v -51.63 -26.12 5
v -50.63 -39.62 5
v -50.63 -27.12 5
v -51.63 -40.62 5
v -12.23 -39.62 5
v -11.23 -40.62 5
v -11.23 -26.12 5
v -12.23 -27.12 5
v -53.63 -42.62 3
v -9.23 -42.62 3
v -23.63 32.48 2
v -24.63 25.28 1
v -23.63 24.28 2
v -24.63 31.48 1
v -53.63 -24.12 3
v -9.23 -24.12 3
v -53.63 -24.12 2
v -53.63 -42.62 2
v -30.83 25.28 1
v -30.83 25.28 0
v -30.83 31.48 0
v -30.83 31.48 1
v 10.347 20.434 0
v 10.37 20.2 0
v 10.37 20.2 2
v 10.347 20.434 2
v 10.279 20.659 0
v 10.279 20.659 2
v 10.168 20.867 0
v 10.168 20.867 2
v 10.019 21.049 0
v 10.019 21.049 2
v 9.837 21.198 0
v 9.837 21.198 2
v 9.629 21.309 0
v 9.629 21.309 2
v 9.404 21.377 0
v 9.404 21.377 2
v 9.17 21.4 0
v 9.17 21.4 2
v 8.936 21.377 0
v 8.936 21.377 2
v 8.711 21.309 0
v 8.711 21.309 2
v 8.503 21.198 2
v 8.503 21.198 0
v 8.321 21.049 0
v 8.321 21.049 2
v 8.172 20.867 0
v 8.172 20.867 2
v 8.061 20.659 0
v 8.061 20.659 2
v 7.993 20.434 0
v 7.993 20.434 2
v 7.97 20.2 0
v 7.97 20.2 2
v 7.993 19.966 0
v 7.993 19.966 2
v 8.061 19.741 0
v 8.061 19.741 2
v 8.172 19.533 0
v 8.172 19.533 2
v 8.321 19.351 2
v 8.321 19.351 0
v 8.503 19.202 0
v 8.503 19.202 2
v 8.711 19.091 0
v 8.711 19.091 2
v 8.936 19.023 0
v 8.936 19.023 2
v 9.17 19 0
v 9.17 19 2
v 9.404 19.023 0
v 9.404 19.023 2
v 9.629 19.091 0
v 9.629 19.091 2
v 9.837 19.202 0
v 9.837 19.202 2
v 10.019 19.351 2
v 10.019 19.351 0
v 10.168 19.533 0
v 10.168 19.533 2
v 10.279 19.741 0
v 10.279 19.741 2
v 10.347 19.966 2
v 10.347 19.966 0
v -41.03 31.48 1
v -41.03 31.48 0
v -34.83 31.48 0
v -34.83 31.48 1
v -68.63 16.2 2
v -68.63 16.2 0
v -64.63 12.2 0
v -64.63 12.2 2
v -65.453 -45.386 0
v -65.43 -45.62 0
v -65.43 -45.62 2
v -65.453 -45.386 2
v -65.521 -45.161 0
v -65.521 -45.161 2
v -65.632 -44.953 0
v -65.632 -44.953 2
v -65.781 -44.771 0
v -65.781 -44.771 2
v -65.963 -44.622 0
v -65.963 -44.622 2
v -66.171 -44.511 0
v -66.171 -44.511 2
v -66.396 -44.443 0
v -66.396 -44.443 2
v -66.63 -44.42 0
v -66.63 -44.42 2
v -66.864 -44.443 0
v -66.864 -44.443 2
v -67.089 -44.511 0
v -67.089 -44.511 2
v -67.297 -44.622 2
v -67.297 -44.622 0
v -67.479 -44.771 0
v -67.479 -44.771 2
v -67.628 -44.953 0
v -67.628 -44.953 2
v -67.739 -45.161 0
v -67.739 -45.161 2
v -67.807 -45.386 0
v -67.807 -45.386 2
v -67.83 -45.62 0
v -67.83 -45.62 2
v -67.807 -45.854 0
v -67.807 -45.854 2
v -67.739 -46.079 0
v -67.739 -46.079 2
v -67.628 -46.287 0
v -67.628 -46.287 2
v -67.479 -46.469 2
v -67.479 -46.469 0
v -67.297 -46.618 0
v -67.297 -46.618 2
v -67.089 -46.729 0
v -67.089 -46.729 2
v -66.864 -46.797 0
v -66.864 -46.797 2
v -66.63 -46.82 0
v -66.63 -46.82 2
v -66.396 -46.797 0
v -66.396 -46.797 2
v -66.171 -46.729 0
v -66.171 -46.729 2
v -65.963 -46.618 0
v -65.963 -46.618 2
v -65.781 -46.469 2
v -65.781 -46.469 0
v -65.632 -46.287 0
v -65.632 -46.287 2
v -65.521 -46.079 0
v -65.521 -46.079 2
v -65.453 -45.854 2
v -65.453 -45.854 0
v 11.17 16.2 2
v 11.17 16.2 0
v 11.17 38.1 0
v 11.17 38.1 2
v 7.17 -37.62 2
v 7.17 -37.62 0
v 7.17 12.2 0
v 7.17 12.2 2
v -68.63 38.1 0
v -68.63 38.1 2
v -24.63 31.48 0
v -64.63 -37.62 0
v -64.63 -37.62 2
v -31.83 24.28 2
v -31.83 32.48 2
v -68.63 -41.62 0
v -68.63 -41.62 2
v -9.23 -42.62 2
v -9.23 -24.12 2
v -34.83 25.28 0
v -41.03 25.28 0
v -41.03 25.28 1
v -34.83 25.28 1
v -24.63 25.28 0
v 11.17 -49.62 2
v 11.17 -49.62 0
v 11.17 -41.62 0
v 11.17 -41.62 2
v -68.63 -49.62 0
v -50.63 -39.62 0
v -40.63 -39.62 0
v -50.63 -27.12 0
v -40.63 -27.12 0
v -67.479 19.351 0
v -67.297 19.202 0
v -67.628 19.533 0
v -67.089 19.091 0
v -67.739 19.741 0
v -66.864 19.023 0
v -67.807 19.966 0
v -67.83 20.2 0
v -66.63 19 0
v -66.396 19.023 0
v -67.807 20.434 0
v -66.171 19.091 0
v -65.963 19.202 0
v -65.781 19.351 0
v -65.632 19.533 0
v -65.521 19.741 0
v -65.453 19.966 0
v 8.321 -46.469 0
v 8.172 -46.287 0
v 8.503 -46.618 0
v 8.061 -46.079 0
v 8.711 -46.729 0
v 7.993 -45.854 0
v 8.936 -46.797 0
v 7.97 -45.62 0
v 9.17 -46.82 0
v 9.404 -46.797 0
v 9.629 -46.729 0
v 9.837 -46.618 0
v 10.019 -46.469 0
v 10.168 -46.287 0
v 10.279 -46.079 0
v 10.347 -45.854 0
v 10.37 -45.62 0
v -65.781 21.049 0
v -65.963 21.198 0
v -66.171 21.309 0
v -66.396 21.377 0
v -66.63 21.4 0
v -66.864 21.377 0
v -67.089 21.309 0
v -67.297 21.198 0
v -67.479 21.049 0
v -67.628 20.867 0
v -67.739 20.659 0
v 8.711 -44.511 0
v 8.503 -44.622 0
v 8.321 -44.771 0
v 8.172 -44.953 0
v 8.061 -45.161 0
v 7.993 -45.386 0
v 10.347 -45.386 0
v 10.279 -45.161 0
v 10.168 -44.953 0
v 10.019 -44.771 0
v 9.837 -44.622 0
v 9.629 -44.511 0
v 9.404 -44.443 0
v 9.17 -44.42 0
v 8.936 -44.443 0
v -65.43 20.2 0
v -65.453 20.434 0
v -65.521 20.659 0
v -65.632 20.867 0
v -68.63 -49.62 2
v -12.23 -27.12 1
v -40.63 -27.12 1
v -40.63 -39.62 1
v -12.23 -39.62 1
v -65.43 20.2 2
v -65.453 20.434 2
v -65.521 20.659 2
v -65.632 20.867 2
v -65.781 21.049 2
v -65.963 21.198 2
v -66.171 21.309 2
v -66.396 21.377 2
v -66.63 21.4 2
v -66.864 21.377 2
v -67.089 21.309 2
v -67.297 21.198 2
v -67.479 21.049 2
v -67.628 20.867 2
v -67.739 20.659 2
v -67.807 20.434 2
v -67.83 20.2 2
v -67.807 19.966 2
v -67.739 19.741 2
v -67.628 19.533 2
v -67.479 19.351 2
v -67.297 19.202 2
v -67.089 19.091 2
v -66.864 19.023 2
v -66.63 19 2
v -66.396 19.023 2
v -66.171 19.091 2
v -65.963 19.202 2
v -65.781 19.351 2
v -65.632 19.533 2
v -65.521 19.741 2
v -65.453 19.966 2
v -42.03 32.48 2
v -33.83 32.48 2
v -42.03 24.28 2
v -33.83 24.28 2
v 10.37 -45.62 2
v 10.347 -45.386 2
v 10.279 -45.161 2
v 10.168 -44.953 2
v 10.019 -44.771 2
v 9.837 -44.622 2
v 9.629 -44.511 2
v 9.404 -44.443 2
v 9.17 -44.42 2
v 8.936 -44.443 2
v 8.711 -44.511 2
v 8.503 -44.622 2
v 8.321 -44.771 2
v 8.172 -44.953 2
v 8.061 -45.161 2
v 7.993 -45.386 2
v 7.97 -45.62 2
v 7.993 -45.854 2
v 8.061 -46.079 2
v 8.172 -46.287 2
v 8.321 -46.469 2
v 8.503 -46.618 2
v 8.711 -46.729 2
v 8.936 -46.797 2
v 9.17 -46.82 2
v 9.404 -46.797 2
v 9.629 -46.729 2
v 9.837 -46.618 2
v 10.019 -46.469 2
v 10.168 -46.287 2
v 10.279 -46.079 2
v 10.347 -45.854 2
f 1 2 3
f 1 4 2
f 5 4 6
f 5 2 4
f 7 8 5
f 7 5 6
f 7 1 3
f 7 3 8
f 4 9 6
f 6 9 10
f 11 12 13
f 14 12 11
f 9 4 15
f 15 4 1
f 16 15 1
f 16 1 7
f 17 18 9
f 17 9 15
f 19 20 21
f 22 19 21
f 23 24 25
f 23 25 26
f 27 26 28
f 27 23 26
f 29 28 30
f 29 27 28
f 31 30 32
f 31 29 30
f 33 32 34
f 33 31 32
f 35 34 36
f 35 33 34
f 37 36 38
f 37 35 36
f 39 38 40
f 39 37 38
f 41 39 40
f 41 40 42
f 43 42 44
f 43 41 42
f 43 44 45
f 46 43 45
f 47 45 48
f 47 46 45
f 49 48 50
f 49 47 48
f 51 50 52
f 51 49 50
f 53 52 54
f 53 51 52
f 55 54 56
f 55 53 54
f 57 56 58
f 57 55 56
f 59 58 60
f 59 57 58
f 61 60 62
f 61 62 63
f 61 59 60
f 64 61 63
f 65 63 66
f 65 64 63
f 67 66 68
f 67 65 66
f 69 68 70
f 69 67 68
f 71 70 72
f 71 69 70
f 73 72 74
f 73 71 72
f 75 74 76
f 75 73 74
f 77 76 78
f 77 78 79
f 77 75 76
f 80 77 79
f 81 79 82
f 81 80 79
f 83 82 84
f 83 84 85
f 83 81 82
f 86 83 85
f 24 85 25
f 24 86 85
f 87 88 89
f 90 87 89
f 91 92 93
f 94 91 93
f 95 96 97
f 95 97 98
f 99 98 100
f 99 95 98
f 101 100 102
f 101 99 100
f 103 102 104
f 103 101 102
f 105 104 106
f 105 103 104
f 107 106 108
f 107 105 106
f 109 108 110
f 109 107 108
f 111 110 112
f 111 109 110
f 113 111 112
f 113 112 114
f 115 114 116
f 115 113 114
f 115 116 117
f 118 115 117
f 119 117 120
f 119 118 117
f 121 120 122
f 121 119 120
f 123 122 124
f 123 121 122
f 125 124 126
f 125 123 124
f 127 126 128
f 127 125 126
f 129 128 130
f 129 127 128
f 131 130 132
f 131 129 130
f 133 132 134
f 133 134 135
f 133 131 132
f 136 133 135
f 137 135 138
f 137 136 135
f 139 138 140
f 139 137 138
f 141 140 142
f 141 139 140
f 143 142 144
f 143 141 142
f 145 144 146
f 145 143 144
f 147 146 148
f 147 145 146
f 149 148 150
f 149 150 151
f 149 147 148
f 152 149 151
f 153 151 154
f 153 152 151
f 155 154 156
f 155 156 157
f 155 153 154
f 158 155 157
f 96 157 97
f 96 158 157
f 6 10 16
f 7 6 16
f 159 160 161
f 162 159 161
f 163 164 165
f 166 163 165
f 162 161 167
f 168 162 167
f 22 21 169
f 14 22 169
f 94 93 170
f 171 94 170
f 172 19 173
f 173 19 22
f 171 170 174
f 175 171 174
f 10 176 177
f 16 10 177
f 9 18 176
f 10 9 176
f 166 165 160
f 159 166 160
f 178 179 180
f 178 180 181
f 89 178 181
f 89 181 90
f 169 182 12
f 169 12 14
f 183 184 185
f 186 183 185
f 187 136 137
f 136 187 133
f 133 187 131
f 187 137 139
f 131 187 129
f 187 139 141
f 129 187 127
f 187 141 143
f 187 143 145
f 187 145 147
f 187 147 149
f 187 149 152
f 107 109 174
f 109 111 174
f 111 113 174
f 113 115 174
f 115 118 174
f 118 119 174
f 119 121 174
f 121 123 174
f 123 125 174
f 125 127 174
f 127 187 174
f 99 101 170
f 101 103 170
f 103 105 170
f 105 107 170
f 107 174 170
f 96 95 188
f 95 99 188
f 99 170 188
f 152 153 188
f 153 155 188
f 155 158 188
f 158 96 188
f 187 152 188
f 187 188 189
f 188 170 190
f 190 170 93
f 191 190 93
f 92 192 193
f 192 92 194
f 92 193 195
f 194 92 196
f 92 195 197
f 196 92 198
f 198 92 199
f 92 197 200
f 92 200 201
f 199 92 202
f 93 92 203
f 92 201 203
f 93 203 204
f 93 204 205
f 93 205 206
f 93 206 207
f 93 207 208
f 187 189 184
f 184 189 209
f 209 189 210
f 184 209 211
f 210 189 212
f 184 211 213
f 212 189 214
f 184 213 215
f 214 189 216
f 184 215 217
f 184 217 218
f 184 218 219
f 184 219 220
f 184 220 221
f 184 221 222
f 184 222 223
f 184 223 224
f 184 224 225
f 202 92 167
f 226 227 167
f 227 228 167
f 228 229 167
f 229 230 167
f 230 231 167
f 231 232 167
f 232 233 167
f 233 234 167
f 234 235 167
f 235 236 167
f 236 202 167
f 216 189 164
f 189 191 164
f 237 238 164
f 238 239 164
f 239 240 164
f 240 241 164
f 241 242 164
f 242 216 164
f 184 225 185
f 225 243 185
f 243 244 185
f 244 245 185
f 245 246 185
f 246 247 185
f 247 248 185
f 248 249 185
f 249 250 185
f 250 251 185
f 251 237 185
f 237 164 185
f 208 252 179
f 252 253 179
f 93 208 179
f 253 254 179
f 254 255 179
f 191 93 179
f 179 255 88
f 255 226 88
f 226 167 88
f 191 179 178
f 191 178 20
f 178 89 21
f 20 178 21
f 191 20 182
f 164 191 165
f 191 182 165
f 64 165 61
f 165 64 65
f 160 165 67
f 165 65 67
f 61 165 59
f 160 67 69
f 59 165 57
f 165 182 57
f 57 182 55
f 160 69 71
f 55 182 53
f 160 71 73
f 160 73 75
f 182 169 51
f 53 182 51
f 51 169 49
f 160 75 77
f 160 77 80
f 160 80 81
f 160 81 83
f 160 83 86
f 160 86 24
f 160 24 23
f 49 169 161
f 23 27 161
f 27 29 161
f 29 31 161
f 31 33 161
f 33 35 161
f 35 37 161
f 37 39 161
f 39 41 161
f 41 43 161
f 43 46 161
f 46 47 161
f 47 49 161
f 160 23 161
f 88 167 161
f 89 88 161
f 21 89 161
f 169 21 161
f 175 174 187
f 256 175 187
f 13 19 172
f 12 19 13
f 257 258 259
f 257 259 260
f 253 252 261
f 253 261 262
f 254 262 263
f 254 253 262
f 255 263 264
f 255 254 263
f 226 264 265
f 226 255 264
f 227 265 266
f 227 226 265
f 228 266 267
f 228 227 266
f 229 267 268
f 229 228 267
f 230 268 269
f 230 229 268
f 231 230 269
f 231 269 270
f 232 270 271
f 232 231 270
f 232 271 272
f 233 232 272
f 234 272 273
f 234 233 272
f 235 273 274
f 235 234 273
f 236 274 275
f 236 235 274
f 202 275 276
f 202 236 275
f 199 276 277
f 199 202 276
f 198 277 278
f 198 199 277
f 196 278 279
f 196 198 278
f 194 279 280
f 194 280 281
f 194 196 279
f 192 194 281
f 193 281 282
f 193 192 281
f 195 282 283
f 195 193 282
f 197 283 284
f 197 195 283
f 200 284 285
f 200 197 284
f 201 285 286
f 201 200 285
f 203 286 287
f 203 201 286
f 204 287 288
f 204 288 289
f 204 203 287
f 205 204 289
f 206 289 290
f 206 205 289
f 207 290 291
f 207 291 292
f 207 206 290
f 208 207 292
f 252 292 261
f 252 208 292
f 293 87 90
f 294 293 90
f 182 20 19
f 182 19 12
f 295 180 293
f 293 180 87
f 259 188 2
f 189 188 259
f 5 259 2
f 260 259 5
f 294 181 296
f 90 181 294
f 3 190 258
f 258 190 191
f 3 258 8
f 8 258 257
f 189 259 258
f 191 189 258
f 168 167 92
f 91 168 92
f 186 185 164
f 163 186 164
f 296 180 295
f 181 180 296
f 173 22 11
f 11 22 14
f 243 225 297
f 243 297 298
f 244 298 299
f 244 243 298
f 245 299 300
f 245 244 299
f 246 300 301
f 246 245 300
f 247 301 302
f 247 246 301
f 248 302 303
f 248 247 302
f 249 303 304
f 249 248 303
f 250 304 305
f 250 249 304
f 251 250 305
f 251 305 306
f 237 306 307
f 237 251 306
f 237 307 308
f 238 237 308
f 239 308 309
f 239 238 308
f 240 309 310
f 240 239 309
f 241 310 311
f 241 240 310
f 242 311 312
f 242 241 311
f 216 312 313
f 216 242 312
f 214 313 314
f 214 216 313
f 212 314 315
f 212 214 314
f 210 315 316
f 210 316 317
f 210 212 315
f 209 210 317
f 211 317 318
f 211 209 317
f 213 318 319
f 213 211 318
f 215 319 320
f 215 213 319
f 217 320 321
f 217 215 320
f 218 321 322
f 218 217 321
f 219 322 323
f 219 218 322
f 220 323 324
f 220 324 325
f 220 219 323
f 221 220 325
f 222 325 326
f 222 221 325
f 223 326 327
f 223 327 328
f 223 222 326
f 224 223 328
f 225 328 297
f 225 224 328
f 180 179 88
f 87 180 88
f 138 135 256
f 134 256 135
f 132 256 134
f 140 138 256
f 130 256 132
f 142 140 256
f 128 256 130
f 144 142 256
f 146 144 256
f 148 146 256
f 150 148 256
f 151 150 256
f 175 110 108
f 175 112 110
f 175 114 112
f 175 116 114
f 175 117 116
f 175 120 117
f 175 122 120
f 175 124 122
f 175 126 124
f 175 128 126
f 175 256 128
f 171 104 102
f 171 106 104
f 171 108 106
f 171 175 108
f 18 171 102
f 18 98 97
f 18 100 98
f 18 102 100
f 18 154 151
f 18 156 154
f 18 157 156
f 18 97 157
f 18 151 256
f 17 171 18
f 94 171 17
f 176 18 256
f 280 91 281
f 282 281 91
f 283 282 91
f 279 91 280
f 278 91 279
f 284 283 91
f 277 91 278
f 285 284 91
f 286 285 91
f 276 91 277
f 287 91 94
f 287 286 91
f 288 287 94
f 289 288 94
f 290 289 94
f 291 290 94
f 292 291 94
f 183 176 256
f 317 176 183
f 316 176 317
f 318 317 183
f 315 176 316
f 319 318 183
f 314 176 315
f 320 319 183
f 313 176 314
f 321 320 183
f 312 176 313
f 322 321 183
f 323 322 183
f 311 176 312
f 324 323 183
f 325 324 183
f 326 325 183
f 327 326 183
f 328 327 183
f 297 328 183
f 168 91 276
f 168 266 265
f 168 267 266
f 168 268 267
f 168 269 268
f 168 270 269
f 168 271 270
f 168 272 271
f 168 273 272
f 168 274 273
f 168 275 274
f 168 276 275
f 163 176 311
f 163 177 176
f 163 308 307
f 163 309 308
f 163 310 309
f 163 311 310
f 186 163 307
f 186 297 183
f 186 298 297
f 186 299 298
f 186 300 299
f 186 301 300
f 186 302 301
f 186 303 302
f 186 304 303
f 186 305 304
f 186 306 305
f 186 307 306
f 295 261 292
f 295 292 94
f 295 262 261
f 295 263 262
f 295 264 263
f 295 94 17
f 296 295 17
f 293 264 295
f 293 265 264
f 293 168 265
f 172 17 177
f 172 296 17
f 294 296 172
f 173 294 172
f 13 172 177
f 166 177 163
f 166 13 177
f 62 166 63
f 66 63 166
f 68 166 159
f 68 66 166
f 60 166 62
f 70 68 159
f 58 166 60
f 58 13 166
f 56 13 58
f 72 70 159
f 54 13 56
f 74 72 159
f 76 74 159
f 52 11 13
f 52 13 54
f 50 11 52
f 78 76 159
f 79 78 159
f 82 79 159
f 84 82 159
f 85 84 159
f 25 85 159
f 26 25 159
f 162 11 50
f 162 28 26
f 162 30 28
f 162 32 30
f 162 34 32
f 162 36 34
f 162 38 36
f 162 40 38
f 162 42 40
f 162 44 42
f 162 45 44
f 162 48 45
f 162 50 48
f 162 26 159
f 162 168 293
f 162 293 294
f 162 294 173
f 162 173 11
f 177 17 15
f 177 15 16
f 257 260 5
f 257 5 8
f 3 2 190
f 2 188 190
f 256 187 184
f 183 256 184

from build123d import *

# Parameters (mm, degrees)
SKETCH_1_W          = 6.2
SKETCH_1_H          = 6.2
SKETCH_1_R          = 1.2
EXTRUDE_1_DEPTH     = 2
CUT_EXTRUDE_1_DEPTH = 1
SKETCH_3_W          = 10
SKETCH_3_H          = 12.5
CUT_EXTRUDE_2_DEPTH = 1
CHAMFER_1_SIZE      = 1
SKETCH_4_W          = 44.4
SKETCH_4_H          = 18.5
SKETCH_4_W_2        = 38.4
SKETCH_4_H_2        = 12.5
EXTRUDE_2_DEPTH     = 3
CHAMFER_2_SIZE      = 2


with BuildPart() as part:
    # 草图1 → 凸台-拉伸1 (new body)
    with BuildSketch(Plane.XY):
        Polygon((-68.63, 16.2), (-64.63, 12.2), (-64.63, -37.62), (-68.63, -41.62), (-68.63, -49.62), (11.17, -49.62), (11.17, -41.62), (7.17, -37.62), (7.17, 12.2), (11.17, 16.2), (11.17, 38.1), (-68.63, 38.1), align=None)
        with Locations((-37.93, 28.38)):
            Rectangle(SKETCH_1_W, SKETCH_1_H, mode=Mode.SUBTRACT)
        with Locations((-27.73, 28.38)):
            Rectangle(SKETCH_1_W, SKETCH_1_H, mode=Mode.SUBTRACT)
        with Locations((-66.63, -45.62)):
            Circle(SKETCH_1_R, mode=Mode.SUBTRACT)
        with Locations((9.17, -45.62)):
            Circle(SKETCH_1_R, mode=Mode.SUBTRACT)
        with Locations((-66.63, 20.2)):
            Circle(SKETCH_1_R, mode=Mode.SUBTRACT)
        with Locations((9.17, 20.2)):
            Circle(SKETCH_1_R, mode=Mode.SUBTRACT)
    extrude(amount=EXTRUDE_1_DEPTH)

    # 草图2 → 切除-拉伸1 (cut)
    with BuildSketch(Plane.XY.offset(2)):
        Polygon((-12.23, -27.12), (-39.83, -27.12), (-39.83, -35.02), (-39.83, -39.62), (-12.23, -39.62), align=None)
        Polygon((-39.83, -27.12), (-50.63, -27.12), (-50.63, -39.62), (-39.83, -39.62), (-39.83, -35.02), align=None)
    extrude(amount=-CUT_EXTRUDE_1_DEPTH, mode=Mode.SUBTRACT)

    # 草图3 → 切除-拉伸2 (cut)
    with BuildSketch(Plane.XY.offset(1)):
        with Locations((-45.63, -33.37)):
            Rectangle(SKETCH_3_W, SKETCH_3_H)
    extrude(amount=-CUT_EXTRUDE_2_DEPTH, mode=Mode.SUBTRACT)

    # 倒角1
    chamfer_1_edges = [part.edges().sort_by_distance(p)[0] for p in [
        (-37.93, 25.28, 2),
        (-41.03, 28.38, 2),
        (-37.93, 31.48, 2),
        (-27.73, 31.48, 2),
        (-24.63, 28.38, 2),
        (-27.73, 25.28, 2),
        (-30.83, 28.38, 2),
        (-34.83, 28.38, 2),
    ]]
    chamfer(chamfer_1_edges, length=CHAMFER_1_SIZE)

    # 草图4 → 凸台-拉伸2 (add)
    with BuildSketch(Plane.XY.offset(2)):
        with Locations((-31.43, -33.37)):
            Rectangle(SKETCH_4_W, SKETCH_4_H)
        with Locations((-31.43, -33.37)):
            Rectangle(SKETCH_4_W_2, SKETCH_4_H_2, mode=Mode.SUBTRACT)
    extrude(amount=EXTRUDE_2_DEPTH)

    # 倒角2
    chamfer_2_edges = [part.edges().sort_by_distance(p)[0] for p in [
        (-31.43, -24.12, 5),
        (-9.23, -33.37, 5),
        (-53.63, -33.37, 5),
        (-31.43, -42.62, 5),
    ]]
    chamfer(chamfer_2_edges, length=CHAMFER_2_SIZE)


solid = part.part
